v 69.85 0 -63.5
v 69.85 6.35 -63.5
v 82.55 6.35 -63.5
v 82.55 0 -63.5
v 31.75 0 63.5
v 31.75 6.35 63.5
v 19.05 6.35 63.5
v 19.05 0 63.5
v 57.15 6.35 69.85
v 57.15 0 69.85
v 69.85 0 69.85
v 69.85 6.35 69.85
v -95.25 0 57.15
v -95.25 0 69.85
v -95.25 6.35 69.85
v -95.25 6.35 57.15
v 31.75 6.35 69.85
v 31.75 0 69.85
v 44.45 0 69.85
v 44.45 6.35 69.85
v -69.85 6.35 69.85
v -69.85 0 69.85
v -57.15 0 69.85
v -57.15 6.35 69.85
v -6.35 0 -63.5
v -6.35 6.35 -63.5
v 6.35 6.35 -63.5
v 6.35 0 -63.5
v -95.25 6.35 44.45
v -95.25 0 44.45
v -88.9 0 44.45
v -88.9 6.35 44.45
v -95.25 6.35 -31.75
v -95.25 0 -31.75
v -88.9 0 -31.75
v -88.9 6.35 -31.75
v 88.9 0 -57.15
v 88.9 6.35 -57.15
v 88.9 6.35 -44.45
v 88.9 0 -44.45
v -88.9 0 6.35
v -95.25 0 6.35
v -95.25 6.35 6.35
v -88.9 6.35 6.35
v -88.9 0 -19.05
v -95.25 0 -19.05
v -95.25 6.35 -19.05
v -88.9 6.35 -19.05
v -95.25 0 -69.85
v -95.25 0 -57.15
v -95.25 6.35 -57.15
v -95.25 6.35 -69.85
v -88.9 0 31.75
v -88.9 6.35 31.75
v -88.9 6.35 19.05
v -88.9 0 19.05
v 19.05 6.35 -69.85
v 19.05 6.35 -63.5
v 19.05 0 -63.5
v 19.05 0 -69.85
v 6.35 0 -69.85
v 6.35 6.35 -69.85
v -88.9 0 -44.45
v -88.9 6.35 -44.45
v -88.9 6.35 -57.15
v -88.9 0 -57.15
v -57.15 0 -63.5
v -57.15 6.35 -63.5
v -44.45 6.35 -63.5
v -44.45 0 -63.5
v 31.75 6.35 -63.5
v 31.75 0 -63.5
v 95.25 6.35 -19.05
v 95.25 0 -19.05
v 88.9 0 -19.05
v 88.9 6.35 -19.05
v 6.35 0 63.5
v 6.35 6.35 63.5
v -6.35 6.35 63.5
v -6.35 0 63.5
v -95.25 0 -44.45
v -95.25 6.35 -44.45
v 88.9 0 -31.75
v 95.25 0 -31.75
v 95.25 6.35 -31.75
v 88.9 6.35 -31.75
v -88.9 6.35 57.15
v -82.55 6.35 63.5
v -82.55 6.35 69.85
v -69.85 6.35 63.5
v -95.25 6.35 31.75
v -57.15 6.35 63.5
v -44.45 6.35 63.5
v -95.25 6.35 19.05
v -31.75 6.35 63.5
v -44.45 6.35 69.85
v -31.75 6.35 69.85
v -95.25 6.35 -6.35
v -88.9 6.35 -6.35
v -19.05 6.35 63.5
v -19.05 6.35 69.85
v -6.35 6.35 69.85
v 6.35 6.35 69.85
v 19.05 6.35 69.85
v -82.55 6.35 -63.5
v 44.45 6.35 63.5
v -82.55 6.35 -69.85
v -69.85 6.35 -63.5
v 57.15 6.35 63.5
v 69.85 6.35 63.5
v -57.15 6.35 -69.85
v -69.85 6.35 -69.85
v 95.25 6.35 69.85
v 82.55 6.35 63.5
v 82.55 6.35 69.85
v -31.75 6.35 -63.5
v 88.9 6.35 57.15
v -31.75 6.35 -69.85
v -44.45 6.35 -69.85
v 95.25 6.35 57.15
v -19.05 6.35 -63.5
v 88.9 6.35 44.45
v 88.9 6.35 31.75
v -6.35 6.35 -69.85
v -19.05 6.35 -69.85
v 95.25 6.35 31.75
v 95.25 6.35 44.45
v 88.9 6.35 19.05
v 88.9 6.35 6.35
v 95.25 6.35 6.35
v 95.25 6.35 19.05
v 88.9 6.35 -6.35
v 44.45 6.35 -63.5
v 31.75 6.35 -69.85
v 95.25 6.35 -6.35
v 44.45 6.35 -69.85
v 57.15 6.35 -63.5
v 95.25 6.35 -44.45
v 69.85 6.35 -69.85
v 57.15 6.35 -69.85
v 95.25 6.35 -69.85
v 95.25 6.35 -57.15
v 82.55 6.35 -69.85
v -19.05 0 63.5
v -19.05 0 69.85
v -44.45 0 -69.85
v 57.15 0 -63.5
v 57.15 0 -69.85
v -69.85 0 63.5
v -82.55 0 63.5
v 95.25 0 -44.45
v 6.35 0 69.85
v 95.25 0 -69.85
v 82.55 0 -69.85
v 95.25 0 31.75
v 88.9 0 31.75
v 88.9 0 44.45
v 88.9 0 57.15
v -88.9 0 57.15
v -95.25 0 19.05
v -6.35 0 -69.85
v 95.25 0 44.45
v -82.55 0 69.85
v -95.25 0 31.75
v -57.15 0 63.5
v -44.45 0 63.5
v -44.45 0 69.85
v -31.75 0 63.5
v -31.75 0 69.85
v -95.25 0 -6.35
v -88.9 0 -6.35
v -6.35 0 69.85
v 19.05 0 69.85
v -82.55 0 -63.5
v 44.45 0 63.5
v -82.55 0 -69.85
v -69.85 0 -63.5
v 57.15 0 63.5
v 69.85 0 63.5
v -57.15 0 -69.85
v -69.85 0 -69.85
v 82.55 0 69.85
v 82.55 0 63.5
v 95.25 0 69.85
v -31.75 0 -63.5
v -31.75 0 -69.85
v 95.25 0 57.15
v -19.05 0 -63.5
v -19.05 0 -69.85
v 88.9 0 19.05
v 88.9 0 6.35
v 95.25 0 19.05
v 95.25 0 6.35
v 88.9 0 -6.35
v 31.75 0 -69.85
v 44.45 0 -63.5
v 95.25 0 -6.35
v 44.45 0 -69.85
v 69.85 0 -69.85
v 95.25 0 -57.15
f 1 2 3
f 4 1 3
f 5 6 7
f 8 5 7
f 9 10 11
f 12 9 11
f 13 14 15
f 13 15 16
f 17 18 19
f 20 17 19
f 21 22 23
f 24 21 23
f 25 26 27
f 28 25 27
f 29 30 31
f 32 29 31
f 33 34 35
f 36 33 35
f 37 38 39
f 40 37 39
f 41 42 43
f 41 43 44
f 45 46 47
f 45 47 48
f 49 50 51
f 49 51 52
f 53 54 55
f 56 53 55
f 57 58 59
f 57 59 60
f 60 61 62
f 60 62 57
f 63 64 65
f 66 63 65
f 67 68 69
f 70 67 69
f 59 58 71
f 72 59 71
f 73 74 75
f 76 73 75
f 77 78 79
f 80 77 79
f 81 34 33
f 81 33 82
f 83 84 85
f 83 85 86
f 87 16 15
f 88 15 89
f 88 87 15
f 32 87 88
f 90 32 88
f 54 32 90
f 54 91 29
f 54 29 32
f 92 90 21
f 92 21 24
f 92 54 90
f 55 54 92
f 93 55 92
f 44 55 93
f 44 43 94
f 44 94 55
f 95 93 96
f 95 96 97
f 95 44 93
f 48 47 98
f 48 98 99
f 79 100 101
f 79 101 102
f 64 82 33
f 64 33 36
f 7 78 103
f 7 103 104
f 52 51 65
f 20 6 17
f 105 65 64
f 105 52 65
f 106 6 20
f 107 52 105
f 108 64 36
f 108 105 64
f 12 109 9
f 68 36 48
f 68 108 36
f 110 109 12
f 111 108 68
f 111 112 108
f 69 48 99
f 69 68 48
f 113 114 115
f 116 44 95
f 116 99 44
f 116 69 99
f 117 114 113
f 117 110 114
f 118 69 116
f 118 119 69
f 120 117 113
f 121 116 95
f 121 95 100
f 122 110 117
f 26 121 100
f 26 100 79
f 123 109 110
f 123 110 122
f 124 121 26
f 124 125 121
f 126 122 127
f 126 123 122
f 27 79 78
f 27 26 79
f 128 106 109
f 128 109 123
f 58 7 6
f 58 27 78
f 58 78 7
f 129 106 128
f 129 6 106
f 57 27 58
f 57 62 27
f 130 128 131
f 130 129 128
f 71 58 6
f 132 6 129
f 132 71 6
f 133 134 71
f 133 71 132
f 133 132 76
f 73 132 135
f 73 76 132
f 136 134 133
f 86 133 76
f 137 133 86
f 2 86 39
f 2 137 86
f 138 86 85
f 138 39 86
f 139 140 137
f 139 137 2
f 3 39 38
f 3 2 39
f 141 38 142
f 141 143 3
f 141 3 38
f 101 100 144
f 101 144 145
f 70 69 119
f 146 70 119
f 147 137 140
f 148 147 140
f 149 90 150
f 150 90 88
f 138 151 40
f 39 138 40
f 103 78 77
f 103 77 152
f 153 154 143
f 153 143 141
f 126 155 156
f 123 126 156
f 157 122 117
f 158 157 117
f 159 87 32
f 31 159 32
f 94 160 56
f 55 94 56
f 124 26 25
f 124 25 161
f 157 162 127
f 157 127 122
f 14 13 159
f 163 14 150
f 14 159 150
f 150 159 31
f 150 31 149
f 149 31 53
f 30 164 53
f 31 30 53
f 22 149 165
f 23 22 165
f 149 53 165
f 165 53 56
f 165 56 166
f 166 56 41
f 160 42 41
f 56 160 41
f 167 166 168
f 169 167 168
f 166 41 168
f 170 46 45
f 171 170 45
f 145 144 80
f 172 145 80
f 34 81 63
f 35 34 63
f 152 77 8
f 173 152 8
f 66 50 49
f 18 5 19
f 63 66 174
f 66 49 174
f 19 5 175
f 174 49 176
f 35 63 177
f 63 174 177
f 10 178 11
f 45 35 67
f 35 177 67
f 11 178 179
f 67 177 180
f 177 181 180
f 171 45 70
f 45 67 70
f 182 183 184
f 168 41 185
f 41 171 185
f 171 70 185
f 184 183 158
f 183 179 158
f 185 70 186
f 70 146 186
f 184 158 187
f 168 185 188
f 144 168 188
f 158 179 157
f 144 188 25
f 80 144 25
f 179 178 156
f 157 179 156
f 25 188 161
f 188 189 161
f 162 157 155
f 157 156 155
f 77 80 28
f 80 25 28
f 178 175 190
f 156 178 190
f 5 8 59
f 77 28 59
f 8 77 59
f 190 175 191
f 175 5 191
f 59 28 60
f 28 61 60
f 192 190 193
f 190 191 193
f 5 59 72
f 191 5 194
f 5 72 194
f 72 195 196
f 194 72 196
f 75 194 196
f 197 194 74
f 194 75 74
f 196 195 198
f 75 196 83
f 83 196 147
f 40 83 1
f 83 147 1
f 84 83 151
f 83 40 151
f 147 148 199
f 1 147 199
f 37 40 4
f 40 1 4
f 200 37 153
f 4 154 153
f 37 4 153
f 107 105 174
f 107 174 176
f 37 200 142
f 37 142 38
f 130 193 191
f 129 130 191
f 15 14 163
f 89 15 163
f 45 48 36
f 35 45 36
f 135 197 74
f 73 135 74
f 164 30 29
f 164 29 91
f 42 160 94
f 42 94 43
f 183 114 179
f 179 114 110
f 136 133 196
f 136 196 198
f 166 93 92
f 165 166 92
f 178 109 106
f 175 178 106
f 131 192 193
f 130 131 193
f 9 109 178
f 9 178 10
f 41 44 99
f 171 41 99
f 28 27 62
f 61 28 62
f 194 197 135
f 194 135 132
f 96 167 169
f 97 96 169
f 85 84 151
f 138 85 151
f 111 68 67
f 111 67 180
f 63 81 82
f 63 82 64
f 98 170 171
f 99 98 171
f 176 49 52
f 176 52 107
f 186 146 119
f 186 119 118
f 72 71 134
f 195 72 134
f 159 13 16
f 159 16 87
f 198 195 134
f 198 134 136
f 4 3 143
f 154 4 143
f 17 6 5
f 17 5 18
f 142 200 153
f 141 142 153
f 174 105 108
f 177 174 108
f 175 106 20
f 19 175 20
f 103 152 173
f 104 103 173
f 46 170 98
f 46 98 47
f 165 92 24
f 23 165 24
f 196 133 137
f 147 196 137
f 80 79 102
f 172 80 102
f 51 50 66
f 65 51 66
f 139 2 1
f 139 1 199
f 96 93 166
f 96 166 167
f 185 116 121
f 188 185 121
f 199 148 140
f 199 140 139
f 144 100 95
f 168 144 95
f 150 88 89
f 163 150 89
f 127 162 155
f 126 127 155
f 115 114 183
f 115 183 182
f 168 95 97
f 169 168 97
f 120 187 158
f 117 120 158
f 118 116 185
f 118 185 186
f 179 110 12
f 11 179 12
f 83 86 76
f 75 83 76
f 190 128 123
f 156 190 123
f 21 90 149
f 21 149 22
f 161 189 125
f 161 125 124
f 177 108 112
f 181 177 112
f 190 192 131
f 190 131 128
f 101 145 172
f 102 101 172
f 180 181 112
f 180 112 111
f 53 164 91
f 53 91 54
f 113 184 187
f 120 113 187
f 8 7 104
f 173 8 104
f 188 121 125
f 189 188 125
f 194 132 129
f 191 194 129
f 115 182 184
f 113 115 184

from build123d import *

# Parameters (mm, degrees)
SKETCH1_W                   = 190.5
SKETCH1_H                   = 139.7
BOSS_EXTRUDE1_DEPTH         = 6.35
CUT_EXTRUDE1_REACH          = 120.287
SKETCH2_W                   = 12.7
SKETCH2_H                   = 12.7
LPATTERN1_COUNT             = 4
LPATTERN1_PITCH             = 25.4
LPATTERN2_COUNT             = 4
LPATTERN2_PITCH             = 25.4
CIRPATTERN1_COUNT           = 2
CIRPATTERN1_COPY_1_REACH    = 120.287
CIRPATTERN1_COPY_1_SKETCH_W = 12.7
CIRPATTERN1_COPY_1_SKETCH_H = 12.7
CIRPATTERN1_COPY_2_REACH    = 120.287
CIRPATTERN1_COPY_2_SKETCH_W = 12.7
CIRPATTERN1_COPY_2_SKETCH_H = 12.7
CIRPATTERN1_COPY_3_REACH    = 120.287
CIRPATTERN1_COPY_3_SKETCH_W = 12.7
CIRPATTERN1_COPY_3_SKETCH_H = 12.7
CIRPATTERN1_COPY_4_REACH    = 120.287
CIRPATTERN1_COPY_4_SKETCH_W = 12.7
CIRPATTERN1_COPY_4_SKETCH_H = 12.7
CIRPATTERN1_COPY_5_REACH    = 120.287
CIRPATTERN1_COPY_5_SKETCH_W = 12.7
CIRPATTERN1_COPY_5_SKETCH_H = 12.7
CIRPATTERN1_COPY_6_REACH    = 120.287
CIRPATTERN1_COPY_6_SKETCH_W = 12.7
CIRPATTERN1_COPY_6_SKETCH_H = 12.7
CUT_EXTRUDE2_REACH          = 120.287
SKETCH3_W                   = 12.7
SKETCH3_H                   = 12.7
LPATTERN3_COUNT             = 3
LPATTERN3_PITCH             = 25.4
LPATTERN4_COUNT             = 3
LPATTERN4_PITCH             = 25.4
CIRPATTERN2_COUNT           = 2
CIRPATTERN2_COPY_1_REACH    = 120.287
CIRPATTERN2_COPY_1_SKETCH_W = 12.7
CIRPATTERN2_COPY_1_SKETCH_H = 12.7
CIRPATTERN2_COPY_2_REACH    = 120.287
CIRPATTERN2_COPY_2_SKETCH_W = 12.7
CIRPATTERN2_COPY_2_SKETCH_H = 12.7
CIRPATTERN2_COPY_3_REACH    = 120.287
CIRPATTERN2_COPY_3_SKETCH_W = 12.7
CIRPATTERN2_COPY_3_SKETCH_H = 12.7
CIRPATTERN2_COPY_4_REACH    = 120.287
CIRPATTERN2_COPY_4_SKETCH_W = 12.7
CIRPATTERN2_COPY_4_SKETCH_H = 12.7


with BuildPart() as part:
    # Sketch1 → Boss-Extrude1 (new body)
    with BuildSketch(Plane(origin=(0, 0, 0), x_dir=(1, 0, 0), z_dir=(0, 1, 0))):
        Rectangle(SKETCH1_W, SKETCH1_H)
    extrude(amount=BOSS_EXTRUDE1_DEPTH)

    # Sketch2 → Cut-Extrude1 (cut, up to next)
    with BuildSketch(Plane(origin=(0, 6.35, 0), x_dir=(1, 0, 0), z_dir=(0, 1, 0)), mode=Mode.PRIVATE) as cut_extrude1_sk1:
        with Locations((0, 69.85)):
            Rectangle(SKETCH2_W, SKETCH2_H)
    cut_extrude1_tool1 = extrude(cut_extrude1_sk1.sketch, amount=-CUT_EXTRUDE1_REACH, mode=Mode.PRIVATE) & part.part
    cut_extrude1 = cut_extrude1_tool1.solids().sort_by_distance((0, 6.35, -69.85))[0]
    add(cut_extrude1, mode=Mode.SUBTRACT)

    # LPattern1: Cut-Extrude1 ×4
    with Locations(*[(-i * LPATTERN1_PITCH, 0, 0) for i in range(1, LPATTERN1_COUNT)]):
        add(cut_extrude1, mode=Mode.SUBTRACT)

    # LPattern2: Cut-Extrude1 ×4
    with Locations(*[(i * LPATTERN2_PITCH, 0, 0) for i in range(1, LPATTERN2_COUNT)]):
        add(cut_extrude1, mode=Mode.SUBTRACT)

    # CirPattern1: Cut-Extrude1 ×2 about axis
    cirpattern1_axis = Axis((0, 0, 0), (0, 1, 0))
    for i in range(1, CIRPATTERN1_COUNT):
        add(cut_extrude1.rotate(cirpattern1_axis, i * 360 / CIRPATTERN1_COUNT), mode=Mode.SUBTRACT)

    # CirPattern1 copy 1 sketch → CirPattern1 copy 1 (cut, up to next)
    with BuildSketch(Plane(origin=(25.4, 6.35, 0), x_dir=(-1, 0, 0), z_dir=(0, 1, 0)), mode=Mode.PRIVATE) as cirpattern1_copy_1_sk1:
        with Locations((0, 69.85)):
            Rectangle(CIRPATTERN1_COPY_1_SKETCH_W, CIRPATTERN1_COPY_1_SKETCH_H)
    cirpattern1_copy_1_tool1 = extrude(cirpattern1_copy_1_sk1.sketch, amount=-CIRPATTERN1_COPY_1_REACH, mode=Mode.PRIVATE) & part.part
    add(cirpattern1_copy_1_tool1.solids().sort_by_distance((25.4, 6.35, 69.85))[0], mode=Mode.SUBTRACT)

    # CirPattern1 copy 2 sketch → CirPattern1 copy 2 (cut, up to next)
    with BuildSketch(Plane(origin=(50.8, 6.35, 0), x_dir=(-1, 0, 0), z_dir=(0, 1, 0)), mode=Mode.PRIVATE) as cirpattern1_copy_2_sk1:
        with Locations((0, 69.85)):
            Rectangle(CIRPATTERN1_COPY_2_SKETCH_W, CIRPATTERN1_COPY_2_SKETCH_H)
    cirpattern1_copy_2_tool1 = extrude(cirpattern1_copy_2_sk1.sketch, amount=-CIRPATTERN1_COPY_2_REACH, mode=Mode.PRIVATE) & part.part
    add(cirpattern1_copy_2_tool1.solids().sort_by_distance((50.8, 6.35, 69.85))[0], mode=Mode.SUBTRACT)

    # CirPattern1 copy 3 sketch → CirPattern1 copy 3 (cut, up to next)
    with BuildSketch(Plane(origin=(76.2, 6.35, 0), x_dir=(-1, 0, 0), z_dir=(0, 1, 0)), mode=Mode.PRIVATE) as cirpattern1_copy_3_sk1:
        with Locations((0, 69.85)):
            Rectangle(CIRPATTERN1_COPY_3_SKETCH_W, CIRPATTERN1_COPY_3_SKETCH_H)
    cirpattern1_copy_3_tool1 = extrude(cirpattern1_copy_3_sk1.sketch, amount=-CIRPATTERN1_COPY_3_REACH, mode=Mode.PRIVATE) & part.part
    add(cirpattern1_copy_3_tool1.solids().sort_by_distance((76.2, 6.35, 69.85))[0], mode=Mode.SUBTRACT)

    # CirPattern1 copy 4 sketch → CirPattern1 copy 4 (cut, up to next)
    with BuildSketch(Plane(origin=(-25.4, 6.35, 0), x_dir=(-1, 0, 0), z_dir=(0, 1, 0)), mode=Mode.PRIVATE) as cirpattern1_copy_4_sk1:
        with Locations((0, 69.85)):
            Rectangle(CIRPATTERN1_COPY_4_SKETCH_W, CIRPATTERN1_COPY_4_SKETCH_H)
    cirpattern1_copy_4_tool1 = extrude(cirpattern1_copy_4_sk1.sketch, amount=-CIRPATTERN1_COPY_4_REACH, mode=Mode.PRIVATE) & part.part
    add(cirpattern1_copy_4_tool1.solids().sort_by_distance((-25.4, 6.35, 69.85))[0], mode=Mode.SUBTRACT)

    # CirPattern1 copy 5 sketch → CirPattern1 copy 5 (cut, up to next)
    with BuildSketch(Plane(origin=(-50.8, 6.35, 0), x_dir=(-1, 0, 0), z_dir=(0, 1, 0)), mode=Mode.PRIVATE) as cirpattern1_copy_5_sk1:
        with Locations((0, 69.85)):
            Rectangle(CIRPATTERN1_COPY_5_SKETCH_W, CIRPATTERN1_COPY_5_SKETCH_H)
    cirpattern1_copy_5_tool1 = extrude(cirpattern1_copy_5_sk1.sketch, amount=-CIRPATTERN1_COPY_5_REACH, mode=Mode.PRIVATE) & part.part
    add(cirpattern1_copy_5_tool1.solids().sort_by_distance((-50.8, 6.35, 69.85))[0], mode=Mode.SUBTRACT)

    # CirPattern1 copy 6 sketch → CirPattern1 copy 6 (cut, up to next)
    with BuildSketch(Plane(origin=(-76.2, 6.35, 0), x_dir=(-1, 0, 0), z_dir=(0, 1, 0)), mode=Mode.PRIVATE) as cirpattern1_copy_6_sk1:
        with Locations((0, 69.85)):
            Rectangle(CIRPATTERN1_COPY_6_SKETCH_W, CIRPATTERN1_COPY_6_SKETCH_H)
    cirpattern1_copy_6_tool1 = extrude(cirpattern1_copy_6_sk1.sketch, amount=-CIRPATTERN1_COPY_6_REACH, mode=Mode.PRIVATE) & part.part
    add(cirpattern1_copy_6_tool1.solids().sort_by_distance((-76.2, 6.35, 69.85))[0], mode=Mode.SUBTRACT)

    # Sketch3 → Cut-Extrude2 (cut, up to next)
    with BuildSketch(Plane(origin=(0, 6.35, 0), x_dir=(1, 0, 0), z_dir=(0, 1, 0)), mode=Mode.PRIVATE) as cut_extrude2_sk1:
        with Locations((-95.25, 0)):
            Rectangle(SKETCH3_W, SKETCH3_H)
    cut_extrude2_tool1 = extrude(cut_extrude2_sk1.sketch, amount=-CUT_EXTRUDE2_REACH, mode=Mode.PRIVATE) & part.part
    cut_extrude2 = cut_extrude2_tool1.solids().sort_by_distance((-95.25, 6.35, 0))[0]
    add(cut_extrude2, mode=Mode.SUBTRACT)

    # LPattern3: Cut-Extrude2 ×3
    with Locations(*[(0, 0, -i * LPATTERN3_PITCH) for i in range(1, LPATTERN3_COUNT)]):
        add(cut_extrude2, mode=Mode.SUBTRACT)

    # LPattern4: Cut-Extrude2 ×3
    with Locations(*[(0, 0, i * LPATTERN4_PITCH) for i in range(1, LPATTERN4_COUNT)]):
        add(cut_extrude2, mode=Mode.SUBTRACT)

    # CirPattern2: Cut-Extrude2 ×2 about axis
    cirpattern2_axis = Axis((0, 0, 0), (0, 1, 0))
    for i in range(1, CIRPATTERN2_COUNT):
        add(cut_extrude2.rotate(cirpattern2_axis, i * 360 / CIRPATTERN2_COUNT), mode=Mode.SUBTRACT)

    # CirPattern2 copy 1 sketch → CirPattern2 copy 1 (cut, up to next)
    with BuildSketch(Plane(origin=(0, 6.35, 25.4), x_dir=(-1, 0, 0), z_dir=(0, 1, 0)), mode=Mode.PRIVATE) as cirpattern2_copy_1_sk1:
        with Locations((-95.25, 0)):
            Rectangle(CIRPATTERN2_COPY_1_SKETCH_W, CIRPATTERN2_COPY_1_SKETCH_H)
    cirpattern2_copy_1_tool1 = extrude(cirpattern2_copy_1_sk1.sketch, amount=-CIRPATTERN2_COPY_1_REACH, mode=Mode.PRIVATE) & part.part
    add(cirpattern2_copy_1_tool1.solids().sort_by_distance((95.25, 6.35, 25.4))[0], mode=Mode.SUBTRACT)

    # CirPattern2 copy 2 sketch → CirPattern2 copy 2 (cut, up to next)
    with BuildSketch(Plane(origin=(0, 6.35, 50.8), x_dir=(-1, 0, 0), z_dir=(0, 1, 0)), mode=Mode.PRIVATE) as cirpattern2_copy_2_sk1:
        with Locations((-95.25, 0)):
            Rectangle(CIRPATTERN2_COPY_2_SKETCH_W, CIRPATTERN2_COPY_2_SKETCH_H)
    cirpattern2_copy_2_tool1 = extrude(cirpattern2_copy_2_sk1.sketch, amount=-CIRPATTERN2_COPY_2_REACH, mode=Mode.PRIVATE) & part.part
    add(cirpattern2_copy_2_tool1.solids().sort_by_distance((95.25, 6.35, 50.8))[0], mode=Mode.SUBTRACT)

    # CirPattern2 copy 3 sketch → CirPattern2 copy 3 (cut, up to next)
    with BuildSketch(Plane(origin=(0, 6.35, -25.4), x_dir=(-1, 0, 0), z_dir=(0, 1, 0)), mode=Mode.PRIVATE) as cirpattern2_copy_3_sk1:
        with Locations((-95.25, 0)):
            Rectangle(CIRPATTERN2_COPY_3_SKETCH_W, CIRPATTERN2_COPY_3_SKETCH_H)
    cirpattern2_copy_3_tool1 = extrude(cirpattern2_copy_3_sk1.sketch, amount=-CIRPATTERN2_COPY_3_REACH, mode=Mode.PRIVATE) & part.part
    add(cirpattern2_copy_3_tool1.solids().sort_by_distance((95.25, 6.35, -25.4))[0], mode=Mode.SUBTRACT)

    # CirPattern2 copy 4 sketch → CirPattern2 copy 4 (cut, up to next)
    with BuildSketch(Plane(origin=(0, 6.35, -50.8), x_dir=(-1, 0, 0), z_dir=(0, 1, 0)), mode=Mode.PRIVATE) as cirpattern2_copy_4_sk1:
        with Locations((-95.25, 0)):
            Rectangle(CIRPATTERN2_COPY_4_SKETCH_W, CIRPATTERN2_COPY_4_SKETCH_H)
    cirpattern2_copy_4_tool1 = extrude(cirpattern2_copy_4_sk1.sketch, amount=-CIRPATTERN2_COPY_4_REACH, mode=Mode.PRIVATE) & part.part
    add(cirpattern2_copy_4_tool1.solids().sort_by_distance((95.25, 6.35, -50.8))[0], mode=Mode.SUBTRACT)


solid = part.part
